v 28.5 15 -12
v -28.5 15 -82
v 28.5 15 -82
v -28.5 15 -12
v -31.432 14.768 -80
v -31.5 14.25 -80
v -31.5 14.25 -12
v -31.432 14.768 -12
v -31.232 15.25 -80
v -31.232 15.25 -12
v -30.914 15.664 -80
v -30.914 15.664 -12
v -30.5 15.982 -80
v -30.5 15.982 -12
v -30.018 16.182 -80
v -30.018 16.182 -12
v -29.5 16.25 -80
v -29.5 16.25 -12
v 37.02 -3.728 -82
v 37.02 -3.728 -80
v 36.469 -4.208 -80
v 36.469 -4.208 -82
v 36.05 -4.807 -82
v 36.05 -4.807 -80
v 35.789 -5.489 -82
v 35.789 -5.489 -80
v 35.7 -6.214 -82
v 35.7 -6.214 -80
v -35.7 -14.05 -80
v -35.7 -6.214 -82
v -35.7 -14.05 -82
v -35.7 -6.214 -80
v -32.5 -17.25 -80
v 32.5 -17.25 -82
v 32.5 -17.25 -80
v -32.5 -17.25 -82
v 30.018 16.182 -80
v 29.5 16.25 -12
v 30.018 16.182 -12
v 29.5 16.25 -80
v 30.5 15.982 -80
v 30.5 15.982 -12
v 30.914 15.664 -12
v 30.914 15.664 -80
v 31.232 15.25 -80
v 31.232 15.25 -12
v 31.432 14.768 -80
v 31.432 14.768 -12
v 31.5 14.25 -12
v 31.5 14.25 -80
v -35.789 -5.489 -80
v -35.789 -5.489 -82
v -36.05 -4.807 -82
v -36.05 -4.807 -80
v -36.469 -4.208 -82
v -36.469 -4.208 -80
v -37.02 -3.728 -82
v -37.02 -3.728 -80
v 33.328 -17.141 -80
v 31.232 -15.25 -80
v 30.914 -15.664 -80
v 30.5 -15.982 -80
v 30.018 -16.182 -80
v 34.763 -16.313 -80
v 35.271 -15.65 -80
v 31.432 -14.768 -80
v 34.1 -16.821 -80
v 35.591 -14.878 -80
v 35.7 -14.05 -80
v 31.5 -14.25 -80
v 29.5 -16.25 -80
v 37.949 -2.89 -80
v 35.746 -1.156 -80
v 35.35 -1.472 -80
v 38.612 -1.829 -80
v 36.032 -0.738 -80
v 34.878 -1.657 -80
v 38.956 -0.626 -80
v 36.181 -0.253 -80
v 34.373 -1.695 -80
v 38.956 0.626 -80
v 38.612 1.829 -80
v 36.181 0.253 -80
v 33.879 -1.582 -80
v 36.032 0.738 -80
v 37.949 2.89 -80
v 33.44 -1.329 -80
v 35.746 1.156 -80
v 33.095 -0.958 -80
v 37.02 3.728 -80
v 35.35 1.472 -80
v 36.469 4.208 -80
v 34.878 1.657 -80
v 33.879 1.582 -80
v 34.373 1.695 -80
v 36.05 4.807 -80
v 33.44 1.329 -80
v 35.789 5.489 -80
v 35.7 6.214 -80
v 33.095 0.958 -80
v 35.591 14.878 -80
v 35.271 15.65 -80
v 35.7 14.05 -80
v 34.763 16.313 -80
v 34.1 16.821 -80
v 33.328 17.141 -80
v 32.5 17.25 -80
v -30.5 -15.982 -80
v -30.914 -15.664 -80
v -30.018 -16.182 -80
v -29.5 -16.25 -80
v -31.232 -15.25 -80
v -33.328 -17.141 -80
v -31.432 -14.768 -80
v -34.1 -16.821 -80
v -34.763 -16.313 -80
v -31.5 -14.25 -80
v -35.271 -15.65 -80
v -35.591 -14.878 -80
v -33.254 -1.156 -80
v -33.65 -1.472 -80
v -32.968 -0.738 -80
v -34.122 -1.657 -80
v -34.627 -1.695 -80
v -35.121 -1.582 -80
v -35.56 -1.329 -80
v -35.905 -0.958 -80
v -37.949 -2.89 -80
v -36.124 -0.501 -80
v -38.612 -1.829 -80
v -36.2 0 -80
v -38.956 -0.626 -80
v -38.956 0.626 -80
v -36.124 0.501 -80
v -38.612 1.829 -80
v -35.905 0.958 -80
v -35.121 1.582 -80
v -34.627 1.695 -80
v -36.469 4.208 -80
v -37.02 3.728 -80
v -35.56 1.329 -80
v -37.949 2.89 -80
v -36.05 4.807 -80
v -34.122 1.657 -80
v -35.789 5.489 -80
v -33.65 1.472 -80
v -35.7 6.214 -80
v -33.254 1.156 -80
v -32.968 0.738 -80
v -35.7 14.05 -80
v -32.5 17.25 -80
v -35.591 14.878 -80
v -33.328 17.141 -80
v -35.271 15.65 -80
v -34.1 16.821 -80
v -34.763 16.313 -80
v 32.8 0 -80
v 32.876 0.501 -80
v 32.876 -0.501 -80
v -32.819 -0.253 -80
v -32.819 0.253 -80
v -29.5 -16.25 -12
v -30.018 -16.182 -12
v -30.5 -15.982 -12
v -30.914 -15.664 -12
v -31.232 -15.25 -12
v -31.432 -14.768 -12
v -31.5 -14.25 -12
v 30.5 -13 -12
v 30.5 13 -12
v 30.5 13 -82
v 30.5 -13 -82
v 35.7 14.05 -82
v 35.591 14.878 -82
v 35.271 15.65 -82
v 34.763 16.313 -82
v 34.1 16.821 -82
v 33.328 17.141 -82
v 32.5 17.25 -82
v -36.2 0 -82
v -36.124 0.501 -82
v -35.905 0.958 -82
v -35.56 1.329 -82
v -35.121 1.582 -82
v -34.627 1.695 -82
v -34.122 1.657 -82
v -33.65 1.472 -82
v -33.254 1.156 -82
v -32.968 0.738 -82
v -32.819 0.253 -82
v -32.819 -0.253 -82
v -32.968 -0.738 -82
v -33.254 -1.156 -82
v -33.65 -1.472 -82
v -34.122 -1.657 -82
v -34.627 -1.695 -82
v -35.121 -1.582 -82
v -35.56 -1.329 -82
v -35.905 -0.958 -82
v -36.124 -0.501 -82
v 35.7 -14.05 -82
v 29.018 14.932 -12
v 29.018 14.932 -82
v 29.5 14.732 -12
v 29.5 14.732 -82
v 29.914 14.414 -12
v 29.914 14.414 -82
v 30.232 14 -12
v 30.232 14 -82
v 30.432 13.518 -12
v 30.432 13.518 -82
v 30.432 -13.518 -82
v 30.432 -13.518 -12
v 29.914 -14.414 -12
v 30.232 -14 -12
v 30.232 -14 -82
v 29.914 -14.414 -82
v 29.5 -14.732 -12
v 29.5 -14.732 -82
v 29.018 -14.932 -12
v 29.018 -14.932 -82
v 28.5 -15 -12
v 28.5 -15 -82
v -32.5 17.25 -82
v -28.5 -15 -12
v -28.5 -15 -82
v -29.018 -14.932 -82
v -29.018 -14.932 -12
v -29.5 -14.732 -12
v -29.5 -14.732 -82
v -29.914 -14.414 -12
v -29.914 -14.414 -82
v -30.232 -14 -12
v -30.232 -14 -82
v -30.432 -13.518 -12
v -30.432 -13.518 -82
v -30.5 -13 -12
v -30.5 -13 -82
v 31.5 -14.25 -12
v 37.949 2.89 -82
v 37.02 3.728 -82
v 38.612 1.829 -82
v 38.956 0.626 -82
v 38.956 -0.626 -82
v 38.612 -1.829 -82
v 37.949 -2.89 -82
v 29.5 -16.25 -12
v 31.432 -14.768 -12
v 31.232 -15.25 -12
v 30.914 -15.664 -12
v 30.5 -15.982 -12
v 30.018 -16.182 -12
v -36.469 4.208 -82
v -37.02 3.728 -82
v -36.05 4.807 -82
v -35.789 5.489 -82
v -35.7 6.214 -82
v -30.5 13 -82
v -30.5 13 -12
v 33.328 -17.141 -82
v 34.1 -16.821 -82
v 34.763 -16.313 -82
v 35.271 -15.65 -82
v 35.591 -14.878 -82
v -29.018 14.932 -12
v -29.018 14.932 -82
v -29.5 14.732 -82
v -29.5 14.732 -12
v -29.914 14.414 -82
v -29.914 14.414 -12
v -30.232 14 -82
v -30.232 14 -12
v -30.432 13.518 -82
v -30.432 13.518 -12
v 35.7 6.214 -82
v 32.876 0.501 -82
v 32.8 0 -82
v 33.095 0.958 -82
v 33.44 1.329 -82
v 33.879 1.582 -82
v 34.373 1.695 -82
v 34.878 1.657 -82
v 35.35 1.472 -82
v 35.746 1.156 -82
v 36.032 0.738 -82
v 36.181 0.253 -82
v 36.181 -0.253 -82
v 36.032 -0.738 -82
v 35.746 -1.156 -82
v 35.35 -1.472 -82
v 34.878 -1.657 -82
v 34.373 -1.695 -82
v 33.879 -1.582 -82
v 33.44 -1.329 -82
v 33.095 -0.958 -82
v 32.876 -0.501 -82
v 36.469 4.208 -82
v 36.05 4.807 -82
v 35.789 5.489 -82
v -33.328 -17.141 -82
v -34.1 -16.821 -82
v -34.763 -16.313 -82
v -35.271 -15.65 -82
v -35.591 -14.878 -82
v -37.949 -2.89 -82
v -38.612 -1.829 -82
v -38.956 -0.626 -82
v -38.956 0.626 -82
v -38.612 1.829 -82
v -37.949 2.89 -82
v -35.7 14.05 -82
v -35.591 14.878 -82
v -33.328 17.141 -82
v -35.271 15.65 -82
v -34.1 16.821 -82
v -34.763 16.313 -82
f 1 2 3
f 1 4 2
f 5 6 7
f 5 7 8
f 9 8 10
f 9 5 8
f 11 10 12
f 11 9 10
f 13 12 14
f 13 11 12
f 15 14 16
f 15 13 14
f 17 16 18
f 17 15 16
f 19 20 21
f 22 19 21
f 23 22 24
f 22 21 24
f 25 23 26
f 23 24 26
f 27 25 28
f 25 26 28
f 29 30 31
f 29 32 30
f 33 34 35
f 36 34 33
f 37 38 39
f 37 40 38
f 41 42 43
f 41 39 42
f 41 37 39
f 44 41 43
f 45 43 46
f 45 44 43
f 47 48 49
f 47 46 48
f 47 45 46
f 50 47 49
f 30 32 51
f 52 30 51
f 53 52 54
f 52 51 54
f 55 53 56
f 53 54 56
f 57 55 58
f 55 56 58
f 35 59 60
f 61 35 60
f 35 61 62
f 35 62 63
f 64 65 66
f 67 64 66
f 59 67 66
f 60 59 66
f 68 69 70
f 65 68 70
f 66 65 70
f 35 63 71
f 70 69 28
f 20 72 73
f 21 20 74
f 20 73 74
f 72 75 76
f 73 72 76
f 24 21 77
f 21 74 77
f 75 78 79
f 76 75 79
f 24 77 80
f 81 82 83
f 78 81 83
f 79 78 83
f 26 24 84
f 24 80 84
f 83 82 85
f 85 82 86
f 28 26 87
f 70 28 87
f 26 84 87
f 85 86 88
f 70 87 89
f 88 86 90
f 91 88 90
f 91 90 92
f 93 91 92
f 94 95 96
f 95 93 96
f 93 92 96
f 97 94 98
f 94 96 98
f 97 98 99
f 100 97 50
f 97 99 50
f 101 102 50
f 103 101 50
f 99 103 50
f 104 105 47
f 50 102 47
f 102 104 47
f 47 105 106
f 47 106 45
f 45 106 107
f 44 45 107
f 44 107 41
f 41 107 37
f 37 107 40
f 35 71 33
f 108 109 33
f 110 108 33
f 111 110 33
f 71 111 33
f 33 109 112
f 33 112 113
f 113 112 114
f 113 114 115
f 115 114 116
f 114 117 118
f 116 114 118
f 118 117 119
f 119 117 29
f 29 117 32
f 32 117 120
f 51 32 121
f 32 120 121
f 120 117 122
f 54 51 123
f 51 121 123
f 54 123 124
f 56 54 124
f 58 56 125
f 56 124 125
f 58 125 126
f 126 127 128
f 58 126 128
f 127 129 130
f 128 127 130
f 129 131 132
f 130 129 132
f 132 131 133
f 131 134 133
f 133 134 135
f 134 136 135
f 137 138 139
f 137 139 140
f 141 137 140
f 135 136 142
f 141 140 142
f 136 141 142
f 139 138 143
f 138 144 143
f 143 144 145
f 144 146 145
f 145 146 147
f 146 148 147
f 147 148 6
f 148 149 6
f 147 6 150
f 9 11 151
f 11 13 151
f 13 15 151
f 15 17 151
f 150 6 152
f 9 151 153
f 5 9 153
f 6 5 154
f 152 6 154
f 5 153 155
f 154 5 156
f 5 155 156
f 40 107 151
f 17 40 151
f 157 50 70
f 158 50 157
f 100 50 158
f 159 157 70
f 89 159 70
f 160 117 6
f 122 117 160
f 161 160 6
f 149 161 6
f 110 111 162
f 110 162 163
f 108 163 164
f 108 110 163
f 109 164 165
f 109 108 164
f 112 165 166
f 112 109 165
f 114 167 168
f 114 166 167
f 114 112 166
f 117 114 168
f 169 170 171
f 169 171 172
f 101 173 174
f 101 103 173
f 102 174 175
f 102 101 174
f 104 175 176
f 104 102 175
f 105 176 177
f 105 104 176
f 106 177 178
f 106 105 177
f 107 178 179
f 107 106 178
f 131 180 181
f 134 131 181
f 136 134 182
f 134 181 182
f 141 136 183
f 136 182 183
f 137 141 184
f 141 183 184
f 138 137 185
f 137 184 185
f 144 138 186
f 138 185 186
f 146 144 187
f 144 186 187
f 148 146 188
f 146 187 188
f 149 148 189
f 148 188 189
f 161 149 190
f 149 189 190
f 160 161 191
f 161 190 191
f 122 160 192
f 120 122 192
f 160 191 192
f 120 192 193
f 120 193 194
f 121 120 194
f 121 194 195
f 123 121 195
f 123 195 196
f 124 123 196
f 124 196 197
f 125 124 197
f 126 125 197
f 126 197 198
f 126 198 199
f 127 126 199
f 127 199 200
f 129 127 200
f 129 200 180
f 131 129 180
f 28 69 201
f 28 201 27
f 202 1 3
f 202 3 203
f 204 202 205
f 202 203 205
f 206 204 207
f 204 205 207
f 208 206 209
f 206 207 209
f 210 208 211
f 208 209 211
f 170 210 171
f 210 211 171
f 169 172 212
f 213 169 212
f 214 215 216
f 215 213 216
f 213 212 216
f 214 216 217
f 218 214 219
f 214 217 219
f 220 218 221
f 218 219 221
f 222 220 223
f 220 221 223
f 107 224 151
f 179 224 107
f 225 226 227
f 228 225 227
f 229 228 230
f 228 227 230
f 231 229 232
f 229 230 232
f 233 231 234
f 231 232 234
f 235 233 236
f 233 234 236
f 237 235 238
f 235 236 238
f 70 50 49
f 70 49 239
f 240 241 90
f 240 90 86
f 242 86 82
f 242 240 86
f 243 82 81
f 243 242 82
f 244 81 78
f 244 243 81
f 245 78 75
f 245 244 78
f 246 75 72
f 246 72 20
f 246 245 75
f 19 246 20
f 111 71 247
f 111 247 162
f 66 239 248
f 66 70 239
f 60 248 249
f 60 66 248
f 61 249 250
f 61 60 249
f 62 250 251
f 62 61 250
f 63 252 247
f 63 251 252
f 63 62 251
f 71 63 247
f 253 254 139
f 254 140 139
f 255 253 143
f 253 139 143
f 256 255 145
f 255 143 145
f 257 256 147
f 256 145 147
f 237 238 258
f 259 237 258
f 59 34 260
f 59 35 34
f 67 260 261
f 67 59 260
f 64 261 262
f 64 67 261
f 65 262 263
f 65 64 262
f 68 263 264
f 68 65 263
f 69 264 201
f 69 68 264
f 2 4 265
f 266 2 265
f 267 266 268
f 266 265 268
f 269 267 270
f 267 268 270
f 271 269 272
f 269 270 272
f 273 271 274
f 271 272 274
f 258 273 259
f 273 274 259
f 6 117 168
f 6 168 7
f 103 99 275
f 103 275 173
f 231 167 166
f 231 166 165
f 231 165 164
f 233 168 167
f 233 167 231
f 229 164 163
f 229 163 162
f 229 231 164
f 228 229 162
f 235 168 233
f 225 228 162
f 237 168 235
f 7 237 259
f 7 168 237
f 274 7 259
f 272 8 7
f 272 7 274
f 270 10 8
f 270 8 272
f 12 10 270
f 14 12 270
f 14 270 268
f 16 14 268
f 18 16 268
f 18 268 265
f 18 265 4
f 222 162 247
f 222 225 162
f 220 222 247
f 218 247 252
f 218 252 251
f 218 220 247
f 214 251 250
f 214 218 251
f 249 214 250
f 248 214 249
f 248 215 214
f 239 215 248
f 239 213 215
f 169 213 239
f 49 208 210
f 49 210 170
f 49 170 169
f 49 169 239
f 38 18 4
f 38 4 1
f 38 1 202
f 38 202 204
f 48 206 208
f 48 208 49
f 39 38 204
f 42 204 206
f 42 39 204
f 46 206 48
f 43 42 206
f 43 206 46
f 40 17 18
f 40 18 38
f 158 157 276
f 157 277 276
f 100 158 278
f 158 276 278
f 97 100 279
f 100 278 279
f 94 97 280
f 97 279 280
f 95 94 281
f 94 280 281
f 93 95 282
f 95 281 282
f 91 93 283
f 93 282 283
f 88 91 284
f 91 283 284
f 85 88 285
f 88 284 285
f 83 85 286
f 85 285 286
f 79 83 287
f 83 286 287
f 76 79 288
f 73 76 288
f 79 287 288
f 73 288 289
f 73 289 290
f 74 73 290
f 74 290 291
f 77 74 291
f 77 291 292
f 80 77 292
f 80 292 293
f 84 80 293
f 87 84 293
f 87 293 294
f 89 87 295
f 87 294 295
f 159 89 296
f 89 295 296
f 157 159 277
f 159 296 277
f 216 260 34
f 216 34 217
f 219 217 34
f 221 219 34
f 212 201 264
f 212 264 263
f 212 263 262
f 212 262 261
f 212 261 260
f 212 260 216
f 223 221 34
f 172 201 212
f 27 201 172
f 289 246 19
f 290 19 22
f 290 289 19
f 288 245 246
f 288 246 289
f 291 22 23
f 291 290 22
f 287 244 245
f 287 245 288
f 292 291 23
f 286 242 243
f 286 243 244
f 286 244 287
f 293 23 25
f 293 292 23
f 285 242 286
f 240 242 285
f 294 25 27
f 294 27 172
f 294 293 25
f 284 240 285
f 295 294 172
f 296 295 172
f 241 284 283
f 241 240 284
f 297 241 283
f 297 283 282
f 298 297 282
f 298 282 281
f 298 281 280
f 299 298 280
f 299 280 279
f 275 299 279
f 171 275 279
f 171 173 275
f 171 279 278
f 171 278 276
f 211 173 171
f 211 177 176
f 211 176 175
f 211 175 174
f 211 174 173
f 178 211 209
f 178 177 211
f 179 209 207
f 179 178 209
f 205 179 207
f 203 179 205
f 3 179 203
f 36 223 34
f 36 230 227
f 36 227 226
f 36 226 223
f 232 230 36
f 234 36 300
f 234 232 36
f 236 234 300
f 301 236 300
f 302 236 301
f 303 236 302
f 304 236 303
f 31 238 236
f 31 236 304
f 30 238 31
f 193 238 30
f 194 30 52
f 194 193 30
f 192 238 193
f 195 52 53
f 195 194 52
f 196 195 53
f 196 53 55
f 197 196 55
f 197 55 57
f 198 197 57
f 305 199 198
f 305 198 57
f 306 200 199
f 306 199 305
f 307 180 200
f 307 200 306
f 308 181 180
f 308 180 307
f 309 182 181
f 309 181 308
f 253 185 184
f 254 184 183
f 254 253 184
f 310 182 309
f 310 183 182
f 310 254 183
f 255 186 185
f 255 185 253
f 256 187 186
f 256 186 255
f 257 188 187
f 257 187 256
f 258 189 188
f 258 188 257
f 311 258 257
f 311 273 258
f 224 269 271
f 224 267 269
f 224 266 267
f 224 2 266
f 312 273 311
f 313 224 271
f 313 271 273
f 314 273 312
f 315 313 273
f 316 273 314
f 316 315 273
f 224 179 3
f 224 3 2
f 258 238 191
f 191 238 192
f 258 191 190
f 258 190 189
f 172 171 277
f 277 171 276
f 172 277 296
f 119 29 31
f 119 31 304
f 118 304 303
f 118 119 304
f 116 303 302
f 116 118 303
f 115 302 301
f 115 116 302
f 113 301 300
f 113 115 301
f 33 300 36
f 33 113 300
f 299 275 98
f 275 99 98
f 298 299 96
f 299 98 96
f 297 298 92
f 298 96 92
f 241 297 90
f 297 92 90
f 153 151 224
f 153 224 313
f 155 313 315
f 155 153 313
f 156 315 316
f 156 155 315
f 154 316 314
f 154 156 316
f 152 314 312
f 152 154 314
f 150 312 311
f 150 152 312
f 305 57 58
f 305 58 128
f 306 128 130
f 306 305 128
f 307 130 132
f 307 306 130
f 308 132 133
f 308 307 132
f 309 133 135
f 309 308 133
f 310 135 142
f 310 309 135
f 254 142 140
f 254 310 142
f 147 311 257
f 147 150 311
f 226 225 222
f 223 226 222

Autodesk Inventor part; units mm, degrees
ref_plane "YZ Plane" through (0, 0, 0) normal (1, 0, 0) x (0, 1, 0)
ref_plane "XZ Plane" through (0, 0, 0) normal (0, 1, 0) x (-1, 0, 0)
ref_plane "XY Plane" through (0, 0, 0) normal (0, 0, 1) x (1, 0, 0)
sketch "Эскиз1" plane through (0, 0, 0) normal (0, 0, 1) x (1, 0, 0)
  line L0 (-30.5, 15) -> (30.5, 15)
  line L1 (30.5, 15) -> (30.5, -15)
  line L2 (30.5, -15) -> (-30.5, -15)
  line L3 (-30.5, -15) -> (-30.5, 15)
  line L4 (0, -24.15) -> (0, 24.15) projected
  line L5 (-45.5, 0) -> (45.5, 0) projected
  line L6 (-32.5, 17.25) -> (32.5, 17.25)
  line L7 (32.5, 17.25) -> (32.5, -17.25)
  line L8 (32.5, -17.25) -> (-32.5, -17.25)
  line L9 (-32.5, -17.25) -> (-32.5, 17.25)
  point P0 (0, 0)
  dimension "d0" = 61
  dimension "d1" = 30
  dimension "d2" = 34.5
  dimension "d3" = 65
extrude "Выдавливание1" add sketch "Эскиз1" along normal blind 3
extrude "Выдавливание2" add sketch "Эскиз1" against normal blind 80 contours L3 L5 L9 L6 L4 L0 | L4 L6 L7 L5 L1 L0 | L3 L2 L4 L8 L9 L5 | L5 L7 L8 L4 L2 L1
sketch "Эскиз2" plane through (0, 0, 3) normal (0, 0, 1) x (1, 0, 0)
  circle A0 centre (-10, 0) radius 5.6
  circle A1 centre (10, 0) radius 5.6
  line L0 (0, -24.15) -> (0, 24.15) projected
  point P0 (0, 0)
  dimension "d8" = 20
  dimension "d9" = 11.2
  dimension "d10" = 11.2
extrude "Выдавливание3" cut sketch "Эскиз2" against normal blind 80
sketch "Эскиз3" plane through (0, 0, -80) normal (0, 0, -1) x (-1, 0, 0)
  line L0 (30.5, -15) -> (-30.5, -15) projected
  circle A0 centre (-10, 0) radius 5.6 projected
  circle A1 centre (10, 0) radius 5.6 projected
  line L1 (-30.5, -15) -> (30.5, -15) projected
  line L2 (30.5, -15) -> (30.5, 15) projected
  line L3 (30.5, 15) -> (-30.5, 15) projected
  line L4 (-30.5, 15) -> (-30.5, -15) projected
  line L5 (32.5, -17.25) -> (-32.5, -17.25)
  line L6 (-35.7, -14.05) -> (-35.7, 14.05)
  line L7 (-32.5, 17.25) -> (32.5, 17.25)
  line L8 (35.7, 14.05) -> (35.7, -14.05)
  line L9 (0, -28.8249) -> (0, 30.0984) projected
  line L10 (57.8663, 0) -> (-57.8663, 0) projected
  line L11 (32.5, -17.25) -> (32.5, 17.25) projected
  line L12 (-32.5, 17.25) -> (-32.5, -17.25) projected
  arc A2 (32.5, -17.25) -> (35.7, -14.05) centre (32.5, -14.05) ccw
  arc A3 (35.7, 14.05) -> (32.5, 17.25) centre (32.5, 14.05) ccw
  arc A4 (-32.5, 17.25) -> (-35.7, 14.05) centre (-32.5, 14.05) ccw
  arc A5 (-35.7, -14.05) -> (-32.5, -17.25) centre (-32.5, -14.05) ccw
  point P0 (0, 0)
  point P1 (35.7, -17.25)
  point P2 (-30.5, -15)
  dimension "d13" = 3.2
  dimension "d14" = 3.2
  dimension "d15" = 3.2
extrude "Выдавливание4" add sketch "Эскиз3" along normal blind 2 contours L2 L10 L11 L5 L9 L0 | L9 L5 L12 L10 L4 L0 | L2 L3 L9 L7 L11 L10 | L11 A3 L8 L10 | L10 L8 A2 L11 | L10 L12 L7 L9 L3 L4 | A5 L6 L10 L12 | L10 L6 A4 L12
sketch "Эскиз4" plane through (0, 0, -82) normal (0, 0, -1) x (-1, 0, 0)
  line L0 (35.7, -14.05) -> (35.7, 14.05) projected
  arc A0 (35.7, -3.2879) -> (35.7, 3.2879) centre (34.5, 0) ccw
  line L1 (30.5, 15) -> (30.5, -15) projected
  arc A1 (35.7, -4.337) -> (35.7, 4.337) centre (34.5, 0) ccw
  line L2 (0, 0) -> (0, 3.9976)
  line L3 (-35.7, 14.05) -> (-35.7, -14.05) projected
  arc A2 (-35.7, 3.2879) -> (-35.7, -3.2879) centre (-34.5, 0) ccw
  arc A3 (-35.7, 4.337) -> (-35.7, -4.337) centre (-34.5, 0) ccw
  circle A4 centre (34.5, 0) radius 1.7
  circle A5 centre (-34.5, 0) radius 1.7
  point P0 (28.7, 0)
  point P1 (30.5, 0)
  point P2 (31, 0)
  point P3 (-35.7, -4.4956)
  point P4 (-35.7, 4.4956)
  dimension "d19" = 7
  dimension "d20" = 4
  dimension "d21" = 1
  dimension "d26" = 3.4
  dimension "d27" = 3.4
extrude "Выдавливание5" add sketch "Эскиз4" against normal blind 2 contours L0 A0 A1 | L0 A4 A0 | L0 A4 picked at (35.8557, 0.1108)
extrude "Выдавливание6" add sketch "Эскиз4" against normal blind 2 contours L3 A2 A3 | L3 A5 A2 | L3 A5 picked at (-35.7794, -0.3021)
extrude "Выдавливание7" cut sketch "Эскиз4" against normal blind 2 contours A4 L0 | L0 A4 | A5 L3 | L3 A5
fillet "Сопряжение1" radius 3 4 edges at (35.7, -4.337, -81) (35.7, 4.337, -81) (-35.7, -4.337, -81) (-35.7, 4.337, -81)
sketch "Эскиз5" plane through (0, 0, 3) normal (0, 0, 1) x (1, 0, 0)
  line L0 (32.5, 17.25) -> (-32.5, 17.25) projected
  circle A0 centre (10, 0) radius 5.6 projected
  circle A1 centre (-10, 0) radius 5.6 projected
  line L1 (32.5, 17.25) -> (-32.5, 17.25) projected
  line L2 (-32.5, 17.25) -> (-32.5, -17.25) projected
  line L3 (-32.5, -17.25) -> (32.5, -17.25) projected
  line L4 (32.5, -17.25) -> (32.5, 17.25) projected
  point P0 (0, 0)
extrude "Выдавливание8" cut sketch "Эскиз5" against normal up to surface (3 mm away) contours L4 L3 L2 L0 | A0 | A1
sketch "Эскиз6" plane through (-32.5, -17.25, 0) normal (0, 0, 1) x (1, 0, 0)
  line L0 (63, 2.25) -> (2, 2.25) projected
  line L1 (2, 2.25) -> (2, 32.25) projected
  line L2 (2, 32.25) -> (63, 32.25) projected
  line L3 (63, 32.25) -> (63, 2.25) projected
  line L4 (0, 0) -> (0, 34.5) projected
  line L5 (65, 0) -> (0, 0) projected
  line L6 (65, 34.5) -> (65, 0) projected
  line L7 (0, 34.5) -> (65, 34.5) projected
  point P0 (32.5, 17.25)
extrude "Выдавливание9" cut sketch "Эскиз1" against normal blind 12 contours L3 L5 L9 L6 L4 L0 | L4 L6 L7 L5 L1 L0 | L3 L2 L4 L8 L9 L5 | L5 L7 L8 L4 L2 L1
sketch "Эскиз7" plane through (0, 0, -12) normal (0, 0, 1) x (1, 0, 0)
  line L0 (-32.5, 17.25) -> (32.5, 17.25) projected
  line L1 (-32.5, 17.25) -> (32.5, 17.25) projected
  line L2 (-32.5, -17.25) -> (-32.5, 17.25) projected
  line L3 (32.5, -17.25) -> (-32.5, -17.25) projected
  line L4 (32.5, 17.25) -> (32.5, -17.25) projected
  line L5 (30.5, -15) -> (30.5, 15) projected
  line L6 (-30.5, -15) -> (30.5, -15) projected
  line L7 (-30.5, 15) -> (-30.5, -15) projected
  line L8 (30.5, 15) -> (-30.5, 15) projected
  line L9 (-31.5, 16.25) -> (31.5, 16.25)
  line L10 (31.5, 16.25) -> (31.5, -16.25)
  line L11 (31.5, -16.25) -> (-31.5, -16.25)
  line L12 (-31.5, -16.25) -> (-31.5, 16.25)
  point P0 (0, 0)
  dimension "d35" = 1
  dimension "d36" = 1
  dimension "d37" = 1
  dimension "d38" = 1
extrude "Выдавливание10" cut sketch "Эскиз7" against normal up to surface (68 mm away) contours L0 L4 L3 L2
fillet "Сопряжение2" radius 2 8 edges at (31.5, 16.25, -46) (30.5, 15, -47) (30.5, -15, -47) (31.5, -16.25, -46) (-31.5, -16.25, -46) (-31.5, 16.25, -46) (-30.5, -15, -47) (-30.5, 15, -47)
sketch "Эскиз10" plane through (-29.5, 16.25, -12) normal (0, 1, 0) x (1, 0, 0)
  point P0 (29.5, -12)
properties part number "нижняя часть держателя аккумов"
